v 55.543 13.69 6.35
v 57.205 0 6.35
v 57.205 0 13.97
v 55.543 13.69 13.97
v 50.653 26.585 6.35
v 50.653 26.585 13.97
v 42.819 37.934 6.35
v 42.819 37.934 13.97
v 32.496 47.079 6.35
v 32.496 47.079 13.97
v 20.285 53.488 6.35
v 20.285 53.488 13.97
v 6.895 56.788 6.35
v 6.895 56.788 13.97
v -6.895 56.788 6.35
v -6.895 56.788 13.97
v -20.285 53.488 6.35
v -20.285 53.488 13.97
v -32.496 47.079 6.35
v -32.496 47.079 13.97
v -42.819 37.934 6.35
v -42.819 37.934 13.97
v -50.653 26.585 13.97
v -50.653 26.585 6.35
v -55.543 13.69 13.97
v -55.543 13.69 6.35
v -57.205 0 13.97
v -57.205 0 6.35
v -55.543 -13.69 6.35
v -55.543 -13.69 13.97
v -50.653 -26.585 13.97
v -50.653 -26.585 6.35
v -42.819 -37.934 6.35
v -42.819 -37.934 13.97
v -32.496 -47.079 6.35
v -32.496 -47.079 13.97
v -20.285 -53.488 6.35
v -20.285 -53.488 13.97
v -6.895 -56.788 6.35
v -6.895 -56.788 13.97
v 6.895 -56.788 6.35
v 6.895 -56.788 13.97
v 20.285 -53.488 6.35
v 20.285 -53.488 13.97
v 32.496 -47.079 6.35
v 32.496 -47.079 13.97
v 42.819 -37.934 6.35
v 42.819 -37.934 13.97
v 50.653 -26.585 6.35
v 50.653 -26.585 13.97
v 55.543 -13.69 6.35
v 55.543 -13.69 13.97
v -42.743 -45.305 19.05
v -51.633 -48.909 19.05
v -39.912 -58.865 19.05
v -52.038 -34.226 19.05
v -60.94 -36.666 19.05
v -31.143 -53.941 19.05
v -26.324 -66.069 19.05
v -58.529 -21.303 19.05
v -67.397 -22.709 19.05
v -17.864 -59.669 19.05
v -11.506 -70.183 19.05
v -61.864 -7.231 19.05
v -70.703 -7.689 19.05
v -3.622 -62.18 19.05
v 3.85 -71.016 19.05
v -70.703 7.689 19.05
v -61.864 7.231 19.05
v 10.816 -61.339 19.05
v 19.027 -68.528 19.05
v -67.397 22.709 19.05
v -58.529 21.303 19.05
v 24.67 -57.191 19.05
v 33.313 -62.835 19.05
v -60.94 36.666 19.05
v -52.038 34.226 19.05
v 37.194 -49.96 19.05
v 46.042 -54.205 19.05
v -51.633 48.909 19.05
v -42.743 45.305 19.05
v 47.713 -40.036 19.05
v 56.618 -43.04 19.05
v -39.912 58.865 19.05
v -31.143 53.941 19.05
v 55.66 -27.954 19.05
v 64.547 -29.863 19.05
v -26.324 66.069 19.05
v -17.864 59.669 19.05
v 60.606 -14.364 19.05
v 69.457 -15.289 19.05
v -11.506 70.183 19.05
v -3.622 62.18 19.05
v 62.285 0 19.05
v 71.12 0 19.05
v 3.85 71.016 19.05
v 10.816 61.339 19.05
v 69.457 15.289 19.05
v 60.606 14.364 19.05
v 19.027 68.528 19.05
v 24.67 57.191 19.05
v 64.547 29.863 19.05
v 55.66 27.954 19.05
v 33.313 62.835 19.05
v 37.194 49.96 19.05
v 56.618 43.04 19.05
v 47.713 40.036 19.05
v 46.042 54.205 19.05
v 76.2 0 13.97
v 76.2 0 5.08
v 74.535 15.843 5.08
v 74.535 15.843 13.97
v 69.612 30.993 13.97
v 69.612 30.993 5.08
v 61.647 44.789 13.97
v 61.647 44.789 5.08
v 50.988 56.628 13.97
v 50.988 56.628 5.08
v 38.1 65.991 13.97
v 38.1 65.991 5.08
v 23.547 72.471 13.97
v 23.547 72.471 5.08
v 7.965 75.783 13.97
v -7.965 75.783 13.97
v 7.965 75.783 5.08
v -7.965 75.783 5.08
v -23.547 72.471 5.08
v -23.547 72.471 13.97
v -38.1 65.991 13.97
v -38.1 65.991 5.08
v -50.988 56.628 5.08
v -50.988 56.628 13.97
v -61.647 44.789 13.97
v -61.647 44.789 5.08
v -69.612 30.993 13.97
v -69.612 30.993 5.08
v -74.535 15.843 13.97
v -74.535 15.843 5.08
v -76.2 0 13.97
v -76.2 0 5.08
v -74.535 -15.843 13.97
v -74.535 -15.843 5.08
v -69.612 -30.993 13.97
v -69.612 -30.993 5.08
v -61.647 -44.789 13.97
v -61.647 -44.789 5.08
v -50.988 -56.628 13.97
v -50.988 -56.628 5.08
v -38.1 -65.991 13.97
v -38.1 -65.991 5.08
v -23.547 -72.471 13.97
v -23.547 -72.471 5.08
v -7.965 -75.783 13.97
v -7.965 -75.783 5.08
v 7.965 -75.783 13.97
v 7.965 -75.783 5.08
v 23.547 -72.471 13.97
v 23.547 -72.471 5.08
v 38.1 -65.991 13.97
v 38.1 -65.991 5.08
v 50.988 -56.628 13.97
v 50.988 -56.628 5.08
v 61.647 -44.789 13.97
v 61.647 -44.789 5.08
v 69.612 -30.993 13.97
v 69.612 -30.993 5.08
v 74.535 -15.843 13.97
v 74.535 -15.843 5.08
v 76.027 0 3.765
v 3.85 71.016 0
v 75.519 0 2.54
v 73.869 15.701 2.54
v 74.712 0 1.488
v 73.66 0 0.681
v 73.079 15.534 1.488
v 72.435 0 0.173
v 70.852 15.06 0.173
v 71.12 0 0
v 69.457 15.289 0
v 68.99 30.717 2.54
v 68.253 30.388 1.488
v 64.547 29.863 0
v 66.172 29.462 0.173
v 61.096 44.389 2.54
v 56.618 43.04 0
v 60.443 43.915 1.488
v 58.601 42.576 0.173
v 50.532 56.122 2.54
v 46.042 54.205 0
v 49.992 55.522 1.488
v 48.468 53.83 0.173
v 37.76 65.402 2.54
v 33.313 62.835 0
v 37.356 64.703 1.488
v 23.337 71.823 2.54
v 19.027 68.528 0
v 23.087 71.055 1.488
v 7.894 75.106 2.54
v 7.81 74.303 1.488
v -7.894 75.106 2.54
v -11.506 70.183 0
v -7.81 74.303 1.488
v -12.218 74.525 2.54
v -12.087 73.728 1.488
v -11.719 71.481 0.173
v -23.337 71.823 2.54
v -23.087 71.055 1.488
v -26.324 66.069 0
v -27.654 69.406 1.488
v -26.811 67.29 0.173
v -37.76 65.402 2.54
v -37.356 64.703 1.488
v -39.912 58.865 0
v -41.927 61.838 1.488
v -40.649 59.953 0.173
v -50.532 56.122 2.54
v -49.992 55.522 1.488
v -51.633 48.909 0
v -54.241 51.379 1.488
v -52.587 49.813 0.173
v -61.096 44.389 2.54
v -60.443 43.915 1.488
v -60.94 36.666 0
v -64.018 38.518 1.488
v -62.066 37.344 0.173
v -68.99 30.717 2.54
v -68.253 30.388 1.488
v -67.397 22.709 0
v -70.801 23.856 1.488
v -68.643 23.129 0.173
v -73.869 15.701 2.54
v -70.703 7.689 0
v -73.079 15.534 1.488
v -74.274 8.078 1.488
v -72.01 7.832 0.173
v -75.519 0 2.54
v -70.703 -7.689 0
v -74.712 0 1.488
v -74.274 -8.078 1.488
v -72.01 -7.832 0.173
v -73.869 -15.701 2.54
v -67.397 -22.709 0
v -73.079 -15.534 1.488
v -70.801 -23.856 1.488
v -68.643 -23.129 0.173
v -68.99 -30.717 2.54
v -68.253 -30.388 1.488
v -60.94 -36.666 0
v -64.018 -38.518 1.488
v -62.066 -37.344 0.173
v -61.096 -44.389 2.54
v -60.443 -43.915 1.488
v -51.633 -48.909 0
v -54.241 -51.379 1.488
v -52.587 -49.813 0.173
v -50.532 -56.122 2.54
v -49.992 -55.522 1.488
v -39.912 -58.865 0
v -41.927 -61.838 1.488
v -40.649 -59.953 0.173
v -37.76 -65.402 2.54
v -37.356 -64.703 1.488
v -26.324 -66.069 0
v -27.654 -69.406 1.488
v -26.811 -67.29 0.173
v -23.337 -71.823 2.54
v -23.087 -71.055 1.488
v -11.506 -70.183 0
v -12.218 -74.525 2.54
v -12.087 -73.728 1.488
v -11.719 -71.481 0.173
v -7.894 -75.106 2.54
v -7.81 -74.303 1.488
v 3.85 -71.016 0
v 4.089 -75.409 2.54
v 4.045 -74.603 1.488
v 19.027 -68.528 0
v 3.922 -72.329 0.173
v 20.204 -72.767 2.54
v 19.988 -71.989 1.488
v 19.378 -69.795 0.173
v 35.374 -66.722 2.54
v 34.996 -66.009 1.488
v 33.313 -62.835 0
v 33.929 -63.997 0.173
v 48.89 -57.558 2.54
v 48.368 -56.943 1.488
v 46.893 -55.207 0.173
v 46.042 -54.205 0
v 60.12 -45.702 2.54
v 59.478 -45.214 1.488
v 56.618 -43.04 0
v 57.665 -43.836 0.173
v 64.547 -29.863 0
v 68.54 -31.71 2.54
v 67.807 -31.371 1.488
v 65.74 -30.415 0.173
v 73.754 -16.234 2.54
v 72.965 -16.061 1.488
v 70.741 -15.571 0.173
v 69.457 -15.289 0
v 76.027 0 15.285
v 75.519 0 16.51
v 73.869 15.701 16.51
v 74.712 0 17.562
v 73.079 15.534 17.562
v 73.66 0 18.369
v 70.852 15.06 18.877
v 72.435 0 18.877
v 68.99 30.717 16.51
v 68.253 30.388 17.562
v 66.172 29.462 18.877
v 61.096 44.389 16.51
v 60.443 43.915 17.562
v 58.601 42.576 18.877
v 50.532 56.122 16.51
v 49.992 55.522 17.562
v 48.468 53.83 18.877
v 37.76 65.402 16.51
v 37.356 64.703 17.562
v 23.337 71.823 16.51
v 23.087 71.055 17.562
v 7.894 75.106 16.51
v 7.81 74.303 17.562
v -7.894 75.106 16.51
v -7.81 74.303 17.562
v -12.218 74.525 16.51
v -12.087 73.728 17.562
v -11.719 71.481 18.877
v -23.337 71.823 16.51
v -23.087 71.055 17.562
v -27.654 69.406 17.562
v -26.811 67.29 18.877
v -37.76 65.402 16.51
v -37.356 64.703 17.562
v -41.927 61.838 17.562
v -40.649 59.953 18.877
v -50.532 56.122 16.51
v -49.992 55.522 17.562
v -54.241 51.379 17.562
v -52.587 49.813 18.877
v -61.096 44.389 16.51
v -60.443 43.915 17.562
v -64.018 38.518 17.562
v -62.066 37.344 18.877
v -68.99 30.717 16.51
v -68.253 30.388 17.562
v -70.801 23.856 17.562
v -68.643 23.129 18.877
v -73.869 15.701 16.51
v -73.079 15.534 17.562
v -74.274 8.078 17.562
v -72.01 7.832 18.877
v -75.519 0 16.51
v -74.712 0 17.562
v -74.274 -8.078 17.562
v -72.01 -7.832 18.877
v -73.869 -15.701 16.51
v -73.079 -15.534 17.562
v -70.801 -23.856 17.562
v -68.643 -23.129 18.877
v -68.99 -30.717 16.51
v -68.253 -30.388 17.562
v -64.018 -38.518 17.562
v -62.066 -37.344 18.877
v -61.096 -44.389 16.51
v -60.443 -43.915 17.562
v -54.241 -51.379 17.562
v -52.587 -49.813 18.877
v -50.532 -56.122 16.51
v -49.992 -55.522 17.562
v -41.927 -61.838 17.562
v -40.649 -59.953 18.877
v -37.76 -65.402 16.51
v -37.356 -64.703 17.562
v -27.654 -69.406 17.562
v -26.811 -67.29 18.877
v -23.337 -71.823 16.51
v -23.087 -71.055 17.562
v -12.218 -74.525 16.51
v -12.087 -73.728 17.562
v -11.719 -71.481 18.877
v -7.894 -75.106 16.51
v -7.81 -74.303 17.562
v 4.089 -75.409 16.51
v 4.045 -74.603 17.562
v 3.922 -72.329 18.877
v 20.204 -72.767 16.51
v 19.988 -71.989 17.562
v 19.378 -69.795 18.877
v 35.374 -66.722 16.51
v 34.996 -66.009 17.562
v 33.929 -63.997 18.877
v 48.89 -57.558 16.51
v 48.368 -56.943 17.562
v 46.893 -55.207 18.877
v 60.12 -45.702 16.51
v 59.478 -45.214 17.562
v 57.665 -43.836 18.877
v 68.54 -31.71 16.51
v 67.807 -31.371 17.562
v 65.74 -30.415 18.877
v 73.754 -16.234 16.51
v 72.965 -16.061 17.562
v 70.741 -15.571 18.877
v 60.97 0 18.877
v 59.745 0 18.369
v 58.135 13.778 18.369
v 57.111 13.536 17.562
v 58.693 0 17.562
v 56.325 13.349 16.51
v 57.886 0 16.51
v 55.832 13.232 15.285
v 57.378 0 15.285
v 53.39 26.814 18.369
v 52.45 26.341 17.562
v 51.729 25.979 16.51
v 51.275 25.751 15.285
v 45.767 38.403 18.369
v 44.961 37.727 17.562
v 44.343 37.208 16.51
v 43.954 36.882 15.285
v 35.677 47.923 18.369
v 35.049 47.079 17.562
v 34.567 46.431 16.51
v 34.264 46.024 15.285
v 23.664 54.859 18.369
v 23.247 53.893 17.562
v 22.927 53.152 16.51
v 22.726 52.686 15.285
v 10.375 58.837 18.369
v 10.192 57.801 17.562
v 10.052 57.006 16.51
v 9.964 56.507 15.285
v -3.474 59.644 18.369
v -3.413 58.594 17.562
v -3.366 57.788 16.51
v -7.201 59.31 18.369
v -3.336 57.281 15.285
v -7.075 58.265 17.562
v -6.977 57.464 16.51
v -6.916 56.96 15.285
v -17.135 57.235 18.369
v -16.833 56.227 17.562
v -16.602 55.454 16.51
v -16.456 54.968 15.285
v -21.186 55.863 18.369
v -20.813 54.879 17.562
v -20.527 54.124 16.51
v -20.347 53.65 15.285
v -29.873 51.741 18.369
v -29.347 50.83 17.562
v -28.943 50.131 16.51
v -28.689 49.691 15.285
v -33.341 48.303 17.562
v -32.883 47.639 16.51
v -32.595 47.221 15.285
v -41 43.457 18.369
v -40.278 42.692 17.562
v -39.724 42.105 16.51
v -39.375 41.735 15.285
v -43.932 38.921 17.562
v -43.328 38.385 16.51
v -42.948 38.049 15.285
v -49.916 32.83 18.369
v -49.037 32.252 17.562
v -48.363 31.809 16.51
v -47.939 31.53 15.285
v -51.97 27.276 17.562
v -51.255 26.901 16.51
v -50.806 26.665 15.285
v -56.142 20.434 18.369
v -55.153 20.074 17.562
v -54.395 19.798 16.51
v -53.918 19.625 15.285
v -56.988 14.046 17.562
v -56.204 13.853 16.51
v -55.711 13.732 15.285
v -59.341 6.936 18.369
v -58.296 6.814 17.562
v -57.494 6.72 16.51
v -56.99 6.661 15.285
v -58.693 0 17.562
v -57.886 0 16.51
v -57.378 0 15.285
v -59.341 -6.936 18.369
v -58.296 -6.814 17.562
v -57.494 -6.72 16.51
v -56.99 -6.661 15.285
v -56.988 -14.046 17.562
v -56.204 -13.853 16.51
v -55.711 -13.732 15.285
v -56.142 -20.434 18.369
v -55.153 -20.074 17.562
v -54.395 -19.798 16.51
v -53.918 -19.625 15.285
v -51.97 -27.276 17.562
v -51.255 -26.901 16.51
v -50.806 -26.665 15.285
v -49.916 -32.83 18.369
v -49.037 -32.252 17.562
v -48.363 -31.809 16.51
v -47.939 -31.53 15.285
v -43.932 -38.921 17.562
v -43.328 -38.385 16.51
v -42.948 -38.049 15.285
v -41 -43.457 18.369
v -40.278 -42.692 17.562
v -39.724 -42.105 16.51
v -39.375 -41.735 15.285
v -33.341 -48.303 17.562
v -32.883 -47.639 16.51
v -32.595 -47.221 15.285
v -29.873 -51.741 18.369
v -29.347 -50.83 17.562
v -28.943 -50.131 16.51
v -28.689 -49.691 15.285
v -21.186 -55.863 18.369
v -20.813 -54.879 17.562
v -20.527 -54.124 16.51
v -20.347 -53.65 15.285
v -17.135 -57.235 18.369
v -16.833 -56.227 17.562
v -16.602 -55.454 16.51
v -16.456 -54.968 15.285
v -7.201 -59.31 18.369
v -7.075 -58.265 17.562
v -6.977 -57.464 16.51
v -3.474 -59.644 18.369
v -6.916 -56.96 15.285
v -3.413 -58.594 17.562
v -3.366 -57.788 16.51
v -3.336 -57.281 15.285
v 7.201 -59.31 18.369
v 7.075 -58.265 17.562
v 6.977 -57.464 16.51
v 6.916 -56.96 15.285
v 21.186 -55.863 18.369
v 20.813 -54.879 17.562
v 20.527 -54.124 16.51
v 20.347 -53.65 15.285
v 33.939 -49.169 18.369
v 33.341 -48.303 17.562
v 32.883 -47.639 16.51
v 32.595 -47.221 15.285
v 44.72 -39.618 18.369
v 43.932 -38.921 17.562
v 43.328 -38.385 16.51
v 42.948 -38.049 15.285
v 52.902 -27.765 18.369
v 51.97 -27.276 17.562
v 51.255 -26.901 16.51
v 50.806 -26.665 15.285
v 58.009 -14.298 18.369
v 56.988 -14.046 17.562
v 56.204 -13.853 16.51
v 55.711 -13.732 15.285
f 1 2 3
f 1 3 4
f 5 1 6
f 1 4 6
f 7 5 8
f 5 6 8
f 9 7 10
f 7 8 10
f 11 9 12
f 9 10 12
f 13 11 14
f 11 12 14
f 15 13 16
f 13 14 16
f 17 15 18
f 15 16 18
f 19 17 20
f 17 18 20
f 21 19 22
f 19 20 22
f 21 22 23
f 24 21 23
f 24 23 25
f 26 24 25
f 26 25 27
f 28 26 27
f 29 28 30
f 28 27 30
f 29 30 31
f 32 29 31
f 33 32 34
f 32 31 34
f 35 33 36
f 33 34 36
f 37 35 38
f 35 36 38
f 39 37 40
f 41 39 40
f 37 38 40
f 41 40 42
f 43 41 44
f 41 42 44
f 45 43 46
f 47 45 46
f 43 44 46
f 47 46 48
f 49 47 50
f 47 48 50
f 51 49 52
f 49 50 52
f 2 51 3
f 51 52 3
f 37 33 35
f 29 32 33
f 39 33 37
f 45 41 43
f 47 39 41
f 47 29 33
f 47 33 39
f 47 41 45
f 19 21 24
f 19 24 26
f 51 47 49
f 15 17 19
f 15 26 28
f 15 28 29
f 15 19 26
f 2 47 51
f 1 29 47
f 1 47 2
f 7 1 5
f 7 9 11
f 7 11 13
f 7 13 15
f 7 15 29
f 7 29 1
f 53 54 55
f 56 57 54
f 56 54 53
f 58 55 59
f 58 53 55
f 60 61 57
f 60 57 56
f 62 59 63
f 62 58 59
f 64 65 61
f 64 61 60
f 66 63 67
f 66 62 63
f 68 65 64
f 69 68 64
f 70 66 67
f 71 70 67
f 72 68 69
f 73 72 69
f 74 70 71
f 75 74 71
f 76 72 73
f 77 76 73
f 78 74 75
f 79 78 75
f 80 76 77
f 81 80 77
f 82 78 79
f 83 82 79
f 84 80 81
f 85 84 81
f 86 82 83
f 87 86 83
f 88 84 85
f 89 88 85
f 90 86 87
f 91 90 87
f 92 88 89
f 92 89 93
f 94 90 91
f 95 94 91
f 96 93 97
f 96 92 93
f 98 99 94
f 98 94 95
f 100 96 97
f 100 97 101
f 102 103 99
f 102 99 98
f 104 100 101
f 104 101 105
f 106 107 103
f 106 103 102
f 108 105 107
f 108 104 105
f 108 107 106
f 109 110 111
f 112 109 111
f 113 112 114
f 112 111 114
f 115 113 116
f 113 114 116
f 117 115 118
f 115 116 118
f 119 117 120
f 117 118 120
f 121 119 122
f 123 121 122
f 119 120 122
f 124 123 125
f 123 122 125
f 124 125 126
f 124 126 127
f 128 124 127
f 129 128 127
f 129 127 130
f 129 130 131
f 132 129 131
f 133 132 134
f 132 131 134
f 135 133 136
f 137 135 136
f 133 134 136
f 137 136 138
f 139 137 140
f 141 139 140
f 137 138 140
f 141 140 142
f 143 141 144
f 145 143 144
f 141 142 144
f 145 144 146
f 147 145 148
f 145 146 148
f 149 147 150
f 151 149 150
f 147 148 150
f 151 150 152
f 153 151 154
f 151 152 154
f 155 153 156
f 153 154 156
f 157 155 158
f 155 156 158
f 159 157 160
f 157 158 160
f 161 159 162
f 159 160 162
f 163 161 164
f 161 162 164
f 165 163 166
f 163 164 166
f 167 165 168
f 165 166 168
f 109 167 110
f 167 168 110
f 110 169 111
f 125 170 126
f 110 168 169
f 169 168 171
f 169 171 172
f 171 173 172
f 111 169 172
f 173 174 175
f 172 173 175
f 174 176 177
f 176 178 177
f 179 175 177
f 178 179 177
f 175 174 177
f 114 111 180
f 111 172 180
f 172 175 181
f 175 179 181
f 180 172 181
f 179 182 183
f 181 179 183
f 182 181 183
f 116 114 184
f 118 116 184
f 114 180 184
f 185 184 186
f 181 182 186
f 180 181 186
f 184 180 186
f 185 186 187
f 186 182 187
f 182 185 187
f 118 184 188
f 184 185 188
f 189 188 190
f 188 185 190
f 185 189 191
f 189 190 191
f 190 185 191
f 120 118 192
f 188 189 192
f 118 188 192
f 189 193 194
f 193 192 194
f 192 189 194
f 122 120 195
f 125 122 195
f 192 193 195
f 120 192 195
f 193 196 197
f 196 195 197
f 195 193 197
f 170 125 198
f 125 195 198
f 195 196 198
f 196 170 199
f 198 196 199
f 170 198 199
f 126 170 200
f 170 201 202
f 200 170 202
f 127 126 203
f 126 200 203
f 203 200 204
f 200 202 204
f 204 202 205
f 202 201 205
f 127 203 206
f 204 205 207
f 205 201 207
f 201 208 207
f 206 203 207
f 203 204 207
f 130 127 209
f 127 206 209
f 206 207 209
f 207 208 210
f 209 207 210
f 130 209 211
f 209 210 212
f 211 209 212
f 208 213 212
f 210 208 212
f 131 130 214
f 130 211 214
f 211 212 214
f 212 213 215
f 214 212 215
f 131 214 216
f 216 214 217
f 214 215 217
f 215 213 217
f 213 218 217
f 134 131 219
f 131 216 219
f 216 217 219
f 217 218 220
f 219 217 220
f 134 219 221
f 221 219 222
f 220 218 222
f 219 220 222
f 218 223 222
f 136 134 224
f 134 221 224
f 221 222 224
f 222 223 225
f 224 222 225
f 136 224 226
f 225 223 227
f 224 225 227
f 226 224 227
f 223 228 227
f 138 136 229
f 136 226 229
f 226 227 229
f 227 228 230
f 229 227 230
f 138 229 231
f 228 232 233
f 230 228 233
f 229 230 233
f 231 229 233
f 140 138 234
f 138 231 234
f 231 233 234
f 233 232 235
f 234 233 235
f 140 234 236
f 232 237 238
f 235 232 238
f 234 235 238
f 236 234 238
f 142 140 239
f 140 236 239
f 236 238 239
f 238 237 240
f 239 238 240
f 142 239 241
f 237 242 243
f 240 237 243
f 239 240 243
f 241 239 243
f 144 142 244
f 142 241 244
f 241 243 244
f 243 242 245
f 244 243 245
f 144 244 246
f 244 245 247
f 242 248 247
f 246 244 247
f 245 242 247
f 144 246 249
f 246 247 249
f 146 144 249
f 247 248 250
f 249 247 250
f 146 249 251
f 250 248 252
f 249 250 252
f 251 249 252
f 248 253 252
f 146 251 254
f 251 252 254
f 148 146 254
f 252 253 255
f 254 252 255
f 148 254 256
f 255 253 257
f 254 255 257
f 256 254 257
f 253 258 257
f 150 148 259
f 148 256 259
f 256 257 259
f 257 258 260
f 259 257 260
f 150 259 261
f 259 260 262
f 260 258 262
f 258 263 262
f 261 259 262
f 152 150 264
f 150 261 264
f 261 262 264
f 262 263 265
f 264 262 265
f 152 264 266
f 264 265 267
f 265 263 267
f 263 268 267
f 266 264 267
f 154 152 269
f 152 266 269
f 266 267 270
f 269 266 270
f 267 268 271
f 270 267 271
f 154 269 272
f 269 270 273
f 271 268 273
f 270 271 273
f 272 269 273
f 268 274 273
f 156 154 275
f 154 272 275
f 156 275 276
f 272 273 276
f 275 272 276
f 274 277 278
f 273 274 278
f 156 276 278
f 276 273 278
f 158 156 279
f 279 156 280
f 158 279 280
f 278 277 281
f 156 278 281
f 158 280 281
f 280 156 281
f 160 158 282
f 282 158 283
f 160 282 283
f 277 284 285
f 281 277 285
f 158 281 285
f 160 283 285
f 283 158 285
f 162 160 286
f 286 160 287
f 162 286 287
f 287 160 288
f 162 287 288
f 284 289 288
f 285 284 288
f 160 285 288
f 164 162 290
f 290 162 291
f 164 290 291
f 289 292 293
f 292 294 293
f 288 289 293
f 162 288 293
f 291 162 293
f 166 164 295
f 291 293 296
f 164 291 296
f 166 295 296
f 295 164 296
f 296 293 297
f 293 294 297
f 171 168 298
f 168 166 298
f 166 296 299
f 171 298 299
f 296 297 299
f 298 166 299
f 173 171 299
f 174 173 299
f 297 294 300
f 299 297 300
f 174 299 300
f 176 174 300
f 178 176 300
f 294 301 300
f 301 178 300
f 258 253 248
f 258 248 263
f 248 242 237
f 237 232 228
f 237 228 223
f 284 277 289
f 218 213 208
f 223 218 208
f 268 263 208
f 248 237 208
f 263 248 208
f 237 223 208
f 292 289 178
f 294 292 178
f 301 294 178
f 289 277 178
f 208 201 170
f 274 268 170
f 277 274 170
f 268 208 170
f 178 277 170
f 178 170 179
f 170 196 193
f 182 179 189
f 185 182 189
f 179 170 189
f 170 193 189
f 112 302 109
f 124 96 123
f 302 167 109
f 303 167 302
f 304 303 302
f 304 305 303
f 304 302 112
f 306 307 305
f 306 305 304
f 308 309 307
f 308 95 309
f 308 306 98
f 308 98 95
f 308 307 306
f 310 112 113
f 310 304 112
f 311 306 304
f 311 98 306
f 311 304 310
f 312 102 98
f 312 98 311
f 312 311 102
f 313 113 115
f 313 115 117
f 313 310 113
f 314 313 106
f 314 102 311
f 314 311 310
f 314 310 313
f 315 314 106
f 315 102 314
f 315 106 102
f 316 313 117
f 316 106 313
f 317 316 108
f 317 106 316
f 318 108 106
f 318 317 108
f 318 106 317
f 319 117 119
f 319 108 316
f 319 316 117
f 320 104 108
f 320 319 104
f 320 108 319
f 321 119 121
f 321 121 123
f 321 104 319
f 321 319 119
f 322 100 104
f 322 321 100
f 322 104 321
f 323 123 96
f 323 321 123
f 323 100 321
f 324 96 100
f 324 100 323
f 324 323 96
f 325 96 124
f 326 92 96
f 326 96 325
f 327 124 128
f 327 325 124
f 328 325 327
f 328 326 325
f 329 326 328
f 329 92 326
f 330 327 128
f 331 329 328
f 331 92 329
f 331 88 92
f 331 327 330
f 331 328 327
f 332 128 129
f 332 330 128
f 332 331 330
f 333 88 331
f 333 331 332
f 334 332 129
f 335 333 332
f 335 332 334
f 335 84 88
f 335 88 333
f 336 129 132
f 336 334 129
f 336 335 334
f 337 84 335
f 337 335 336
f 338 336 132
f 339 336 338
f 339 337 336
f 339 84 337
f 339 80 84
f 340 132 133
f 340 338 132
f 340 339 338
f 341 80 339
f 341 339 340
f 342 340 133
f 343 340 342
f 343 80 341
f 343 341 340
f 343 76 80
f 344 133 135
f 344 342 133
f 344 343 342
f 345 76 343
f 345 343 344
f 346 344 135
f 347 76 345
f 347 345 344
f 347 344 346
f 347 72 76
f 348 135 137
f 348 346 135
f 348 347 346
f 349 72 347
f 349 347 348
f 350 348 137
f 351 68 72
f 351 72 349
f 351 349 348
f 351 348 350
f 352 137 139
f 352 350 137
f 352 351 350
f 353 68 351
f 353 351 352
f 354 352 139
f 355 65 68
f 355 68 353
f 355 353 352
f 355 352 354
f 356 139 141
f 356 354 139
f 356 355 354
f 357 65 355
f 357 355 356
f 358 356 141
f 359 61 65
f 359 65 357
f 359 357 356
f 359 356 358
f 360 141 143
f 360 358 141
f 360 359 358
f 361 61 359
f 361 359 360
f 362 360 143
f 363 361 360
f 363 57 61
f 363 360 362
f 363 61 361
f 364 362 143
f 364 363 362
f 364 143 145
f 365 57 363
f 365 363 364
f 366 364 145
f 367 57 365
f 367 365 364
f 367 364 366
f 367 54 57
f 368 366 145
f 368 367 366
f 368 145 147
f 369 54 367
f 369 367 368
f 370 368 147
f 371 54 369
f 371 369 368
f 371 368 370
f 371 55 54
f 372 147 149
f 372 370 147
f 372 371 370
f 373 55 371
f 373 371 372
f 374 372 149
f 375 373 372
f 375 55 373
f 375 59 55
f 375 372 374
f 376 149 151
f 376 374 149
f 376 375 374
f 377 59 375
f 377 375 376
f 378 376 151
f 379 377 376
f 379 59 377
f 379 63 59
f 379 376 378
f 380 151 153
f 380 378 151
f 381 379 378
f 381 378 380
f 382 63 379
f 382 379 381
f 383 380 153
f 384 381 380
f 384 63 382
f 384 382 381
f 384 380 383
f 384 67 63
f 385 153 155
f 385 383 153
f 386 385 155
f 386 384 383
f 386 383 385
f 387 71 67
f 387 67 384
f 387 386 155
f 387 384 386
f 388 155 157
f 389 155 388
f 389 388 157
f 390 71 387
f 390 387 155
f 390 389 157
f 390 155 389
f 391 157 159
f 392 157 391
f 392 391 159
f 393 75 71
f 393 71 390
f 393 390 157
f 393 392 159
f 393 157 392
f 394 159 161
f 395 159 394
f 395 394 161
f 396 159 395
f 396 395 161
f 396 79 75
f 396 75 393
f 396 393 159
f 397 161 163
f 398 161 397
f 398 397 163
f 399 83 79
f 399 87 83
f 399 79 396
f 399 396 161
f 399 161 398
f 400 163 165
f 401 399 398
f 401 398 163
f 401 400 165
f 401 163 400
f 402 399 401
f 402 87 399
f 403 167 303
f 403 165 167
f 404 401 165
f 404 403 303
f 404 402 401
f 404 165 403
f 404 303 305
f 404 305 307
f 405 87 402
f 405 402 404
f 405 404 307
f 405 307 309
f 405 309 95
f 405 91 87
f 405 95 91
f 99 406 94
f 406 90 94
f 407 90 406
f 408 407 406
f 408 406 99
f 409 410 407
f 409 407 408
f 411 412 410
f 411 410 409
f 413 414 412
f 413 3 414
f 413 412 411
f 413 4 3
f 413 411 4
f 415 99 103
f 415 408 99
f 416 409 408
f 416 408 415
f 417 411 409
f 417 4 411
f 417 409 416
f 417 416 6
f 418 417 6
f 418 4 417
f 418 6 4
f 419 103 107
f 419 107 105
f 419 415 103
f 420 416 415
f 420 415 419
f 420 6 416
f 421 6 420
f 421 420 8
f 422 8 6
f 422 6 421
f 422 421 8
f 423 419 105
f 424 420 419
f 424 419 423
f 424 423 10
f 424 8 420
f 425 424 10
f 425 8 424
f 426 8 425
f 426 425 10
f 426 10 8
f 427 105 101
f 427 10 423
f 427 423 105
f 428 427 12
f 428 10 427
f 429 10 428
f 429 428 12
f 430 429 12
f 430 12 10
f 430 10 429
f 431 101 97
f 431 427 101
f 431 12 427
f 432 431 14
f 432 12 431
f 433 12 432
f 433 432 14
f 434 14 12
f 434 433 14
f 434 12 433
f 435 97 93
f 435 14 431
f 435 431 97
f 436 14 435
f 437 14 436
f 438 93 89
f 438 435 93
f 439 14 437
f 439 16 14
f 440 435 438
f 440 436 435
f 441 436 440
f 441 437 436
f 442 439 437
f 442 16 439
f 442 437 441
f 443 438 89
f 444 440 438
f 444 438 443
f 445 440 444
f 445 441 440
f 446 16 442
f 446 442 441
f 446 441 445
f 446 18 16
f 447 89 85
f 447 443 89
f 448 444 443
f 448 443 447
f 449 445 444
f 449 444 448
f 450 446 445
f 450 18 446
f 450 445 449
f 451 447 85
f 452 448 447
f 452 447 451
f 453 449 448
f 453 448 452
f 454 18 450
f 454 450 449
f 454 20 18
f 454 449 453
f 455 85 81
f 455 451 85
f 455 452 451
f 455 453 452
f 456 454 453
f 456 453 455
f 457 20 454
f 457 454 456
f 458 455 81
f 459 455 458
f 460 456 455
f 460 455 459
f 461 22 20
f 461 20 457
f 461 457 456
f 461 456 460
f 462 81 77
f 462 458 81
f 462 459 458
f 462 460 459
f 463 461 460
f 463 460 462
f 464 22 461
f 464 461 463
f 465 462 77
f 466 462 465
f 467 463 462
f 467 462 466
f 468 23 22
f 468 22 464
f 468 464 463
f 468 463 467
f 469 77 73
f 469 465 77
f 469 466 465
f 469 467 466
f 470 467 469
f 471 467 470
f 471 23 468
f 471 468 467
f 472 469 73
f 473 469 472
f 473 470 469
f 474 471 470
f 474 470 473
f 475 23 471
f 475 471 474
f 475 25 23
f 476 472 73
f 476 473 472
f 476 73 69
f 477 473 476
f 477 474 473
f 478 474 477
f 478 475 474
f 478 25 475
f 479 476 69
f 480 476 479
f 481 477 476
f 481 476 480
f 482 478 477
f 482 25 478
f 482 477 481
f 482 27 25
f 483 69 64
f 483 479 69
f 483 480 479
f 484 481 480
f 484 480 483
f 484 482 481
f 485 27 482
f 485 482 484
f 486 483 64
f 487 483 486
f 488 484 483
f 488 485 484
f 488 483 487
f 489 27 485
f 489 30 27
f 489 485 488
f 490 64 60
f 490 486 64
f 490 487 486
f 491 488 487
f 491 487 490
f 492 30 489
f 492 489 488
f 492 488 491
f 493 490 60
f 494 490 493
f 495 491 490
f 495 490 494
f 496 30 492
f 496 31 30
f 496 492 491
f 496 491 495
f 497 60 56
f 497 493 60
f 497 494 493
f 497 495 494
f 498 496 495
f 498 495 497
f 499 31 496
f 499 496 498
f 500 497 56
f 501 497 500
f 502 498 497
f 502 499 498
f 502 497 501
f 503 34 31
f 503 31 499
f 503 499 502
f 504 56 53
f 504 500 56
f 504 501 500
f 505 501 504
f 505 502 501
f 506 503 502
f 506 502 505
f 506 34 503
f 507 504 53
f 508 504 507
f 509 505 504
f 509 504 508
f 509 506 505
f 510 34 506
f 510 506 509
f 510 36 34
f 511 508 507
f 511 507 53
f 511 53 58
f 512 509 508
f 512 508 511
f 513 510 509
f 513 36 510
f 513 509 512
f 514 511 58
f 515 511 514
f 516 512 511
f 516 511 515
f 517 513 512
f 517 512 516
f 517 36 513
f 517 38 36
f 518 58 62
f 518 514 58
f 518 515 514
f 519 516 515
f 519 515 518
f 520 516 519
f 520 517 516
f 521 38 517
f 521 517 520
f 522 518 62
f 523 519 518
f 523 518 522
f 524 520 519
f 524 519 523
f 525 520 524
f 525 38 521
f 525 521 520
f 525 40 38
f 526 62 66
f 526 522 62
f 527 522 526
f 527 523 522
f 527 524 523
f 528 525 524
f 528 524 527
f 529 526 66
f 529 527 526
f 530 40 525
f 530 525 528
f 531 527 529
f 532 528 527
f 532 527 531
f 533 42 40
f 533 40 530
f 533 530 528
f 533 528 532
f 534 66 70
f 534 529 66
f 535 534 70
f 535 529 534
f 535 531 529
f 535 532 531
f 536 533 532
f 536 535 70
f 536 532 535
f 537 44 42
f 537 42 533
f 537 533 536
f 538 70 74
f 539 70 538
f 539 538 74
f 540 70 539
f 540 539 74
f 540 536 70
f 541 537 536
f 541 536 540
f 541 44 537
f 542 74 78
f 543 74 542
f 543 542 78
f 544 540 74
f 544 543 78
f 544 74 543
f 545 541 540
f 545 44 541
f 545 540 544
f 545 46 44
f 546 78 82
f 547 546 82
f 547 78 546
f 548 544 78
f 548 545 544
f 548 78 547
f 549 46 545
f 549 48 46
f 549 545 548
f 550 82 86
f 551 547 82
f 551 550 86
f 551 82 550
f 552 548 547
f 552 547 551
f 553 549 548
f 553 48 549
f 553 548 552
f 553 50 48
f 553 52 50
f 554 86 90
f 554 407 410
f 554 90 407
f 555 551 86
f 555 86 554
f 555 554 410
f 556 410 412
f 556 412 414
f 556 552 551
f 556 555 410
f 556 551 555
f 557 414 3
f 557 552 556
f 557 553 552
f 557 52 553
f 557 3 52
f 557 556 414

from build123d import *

# Parameters (mm, degrees)
F0_R     = 76.2
F1_DEPTH = 19.05
F2_R     = 57.205145
F3_DEPTH = 12.7
F4_R     = 5.08
F5_R     = 5.08


with BuildPart() as f1:
    # F0 (on Top) → F1 (new body)
    with BuildSketch(Plane.XY):
        Circle(F0_R)
    extrude(amount=F1_DEPTH)

    # F2 (on face) → F3 (cut)
    with BuildSketch(Plane.XY.offset(19.05)):
        Circle(F2_R)
    extrude(amount=-F3_DEPTH, mode=Mode.SUBTRACT)

    # F4
    f4_edges = [f1.edges().sort_by_distance(p)[0] for p in [
        (-57.205145, 0, 19.05),
        (-76.2, 0, 19.05),
    ]]
    fillet(f4_edges, radius=F4_R)

    # F5
    f5_edges = [f1.edges().sort_by_distance(p)[0] for p in [
        (-76.2, 0, 0),
    ]]
    fillet(f5_edges, radius=F5_R)


solid = f1.part
